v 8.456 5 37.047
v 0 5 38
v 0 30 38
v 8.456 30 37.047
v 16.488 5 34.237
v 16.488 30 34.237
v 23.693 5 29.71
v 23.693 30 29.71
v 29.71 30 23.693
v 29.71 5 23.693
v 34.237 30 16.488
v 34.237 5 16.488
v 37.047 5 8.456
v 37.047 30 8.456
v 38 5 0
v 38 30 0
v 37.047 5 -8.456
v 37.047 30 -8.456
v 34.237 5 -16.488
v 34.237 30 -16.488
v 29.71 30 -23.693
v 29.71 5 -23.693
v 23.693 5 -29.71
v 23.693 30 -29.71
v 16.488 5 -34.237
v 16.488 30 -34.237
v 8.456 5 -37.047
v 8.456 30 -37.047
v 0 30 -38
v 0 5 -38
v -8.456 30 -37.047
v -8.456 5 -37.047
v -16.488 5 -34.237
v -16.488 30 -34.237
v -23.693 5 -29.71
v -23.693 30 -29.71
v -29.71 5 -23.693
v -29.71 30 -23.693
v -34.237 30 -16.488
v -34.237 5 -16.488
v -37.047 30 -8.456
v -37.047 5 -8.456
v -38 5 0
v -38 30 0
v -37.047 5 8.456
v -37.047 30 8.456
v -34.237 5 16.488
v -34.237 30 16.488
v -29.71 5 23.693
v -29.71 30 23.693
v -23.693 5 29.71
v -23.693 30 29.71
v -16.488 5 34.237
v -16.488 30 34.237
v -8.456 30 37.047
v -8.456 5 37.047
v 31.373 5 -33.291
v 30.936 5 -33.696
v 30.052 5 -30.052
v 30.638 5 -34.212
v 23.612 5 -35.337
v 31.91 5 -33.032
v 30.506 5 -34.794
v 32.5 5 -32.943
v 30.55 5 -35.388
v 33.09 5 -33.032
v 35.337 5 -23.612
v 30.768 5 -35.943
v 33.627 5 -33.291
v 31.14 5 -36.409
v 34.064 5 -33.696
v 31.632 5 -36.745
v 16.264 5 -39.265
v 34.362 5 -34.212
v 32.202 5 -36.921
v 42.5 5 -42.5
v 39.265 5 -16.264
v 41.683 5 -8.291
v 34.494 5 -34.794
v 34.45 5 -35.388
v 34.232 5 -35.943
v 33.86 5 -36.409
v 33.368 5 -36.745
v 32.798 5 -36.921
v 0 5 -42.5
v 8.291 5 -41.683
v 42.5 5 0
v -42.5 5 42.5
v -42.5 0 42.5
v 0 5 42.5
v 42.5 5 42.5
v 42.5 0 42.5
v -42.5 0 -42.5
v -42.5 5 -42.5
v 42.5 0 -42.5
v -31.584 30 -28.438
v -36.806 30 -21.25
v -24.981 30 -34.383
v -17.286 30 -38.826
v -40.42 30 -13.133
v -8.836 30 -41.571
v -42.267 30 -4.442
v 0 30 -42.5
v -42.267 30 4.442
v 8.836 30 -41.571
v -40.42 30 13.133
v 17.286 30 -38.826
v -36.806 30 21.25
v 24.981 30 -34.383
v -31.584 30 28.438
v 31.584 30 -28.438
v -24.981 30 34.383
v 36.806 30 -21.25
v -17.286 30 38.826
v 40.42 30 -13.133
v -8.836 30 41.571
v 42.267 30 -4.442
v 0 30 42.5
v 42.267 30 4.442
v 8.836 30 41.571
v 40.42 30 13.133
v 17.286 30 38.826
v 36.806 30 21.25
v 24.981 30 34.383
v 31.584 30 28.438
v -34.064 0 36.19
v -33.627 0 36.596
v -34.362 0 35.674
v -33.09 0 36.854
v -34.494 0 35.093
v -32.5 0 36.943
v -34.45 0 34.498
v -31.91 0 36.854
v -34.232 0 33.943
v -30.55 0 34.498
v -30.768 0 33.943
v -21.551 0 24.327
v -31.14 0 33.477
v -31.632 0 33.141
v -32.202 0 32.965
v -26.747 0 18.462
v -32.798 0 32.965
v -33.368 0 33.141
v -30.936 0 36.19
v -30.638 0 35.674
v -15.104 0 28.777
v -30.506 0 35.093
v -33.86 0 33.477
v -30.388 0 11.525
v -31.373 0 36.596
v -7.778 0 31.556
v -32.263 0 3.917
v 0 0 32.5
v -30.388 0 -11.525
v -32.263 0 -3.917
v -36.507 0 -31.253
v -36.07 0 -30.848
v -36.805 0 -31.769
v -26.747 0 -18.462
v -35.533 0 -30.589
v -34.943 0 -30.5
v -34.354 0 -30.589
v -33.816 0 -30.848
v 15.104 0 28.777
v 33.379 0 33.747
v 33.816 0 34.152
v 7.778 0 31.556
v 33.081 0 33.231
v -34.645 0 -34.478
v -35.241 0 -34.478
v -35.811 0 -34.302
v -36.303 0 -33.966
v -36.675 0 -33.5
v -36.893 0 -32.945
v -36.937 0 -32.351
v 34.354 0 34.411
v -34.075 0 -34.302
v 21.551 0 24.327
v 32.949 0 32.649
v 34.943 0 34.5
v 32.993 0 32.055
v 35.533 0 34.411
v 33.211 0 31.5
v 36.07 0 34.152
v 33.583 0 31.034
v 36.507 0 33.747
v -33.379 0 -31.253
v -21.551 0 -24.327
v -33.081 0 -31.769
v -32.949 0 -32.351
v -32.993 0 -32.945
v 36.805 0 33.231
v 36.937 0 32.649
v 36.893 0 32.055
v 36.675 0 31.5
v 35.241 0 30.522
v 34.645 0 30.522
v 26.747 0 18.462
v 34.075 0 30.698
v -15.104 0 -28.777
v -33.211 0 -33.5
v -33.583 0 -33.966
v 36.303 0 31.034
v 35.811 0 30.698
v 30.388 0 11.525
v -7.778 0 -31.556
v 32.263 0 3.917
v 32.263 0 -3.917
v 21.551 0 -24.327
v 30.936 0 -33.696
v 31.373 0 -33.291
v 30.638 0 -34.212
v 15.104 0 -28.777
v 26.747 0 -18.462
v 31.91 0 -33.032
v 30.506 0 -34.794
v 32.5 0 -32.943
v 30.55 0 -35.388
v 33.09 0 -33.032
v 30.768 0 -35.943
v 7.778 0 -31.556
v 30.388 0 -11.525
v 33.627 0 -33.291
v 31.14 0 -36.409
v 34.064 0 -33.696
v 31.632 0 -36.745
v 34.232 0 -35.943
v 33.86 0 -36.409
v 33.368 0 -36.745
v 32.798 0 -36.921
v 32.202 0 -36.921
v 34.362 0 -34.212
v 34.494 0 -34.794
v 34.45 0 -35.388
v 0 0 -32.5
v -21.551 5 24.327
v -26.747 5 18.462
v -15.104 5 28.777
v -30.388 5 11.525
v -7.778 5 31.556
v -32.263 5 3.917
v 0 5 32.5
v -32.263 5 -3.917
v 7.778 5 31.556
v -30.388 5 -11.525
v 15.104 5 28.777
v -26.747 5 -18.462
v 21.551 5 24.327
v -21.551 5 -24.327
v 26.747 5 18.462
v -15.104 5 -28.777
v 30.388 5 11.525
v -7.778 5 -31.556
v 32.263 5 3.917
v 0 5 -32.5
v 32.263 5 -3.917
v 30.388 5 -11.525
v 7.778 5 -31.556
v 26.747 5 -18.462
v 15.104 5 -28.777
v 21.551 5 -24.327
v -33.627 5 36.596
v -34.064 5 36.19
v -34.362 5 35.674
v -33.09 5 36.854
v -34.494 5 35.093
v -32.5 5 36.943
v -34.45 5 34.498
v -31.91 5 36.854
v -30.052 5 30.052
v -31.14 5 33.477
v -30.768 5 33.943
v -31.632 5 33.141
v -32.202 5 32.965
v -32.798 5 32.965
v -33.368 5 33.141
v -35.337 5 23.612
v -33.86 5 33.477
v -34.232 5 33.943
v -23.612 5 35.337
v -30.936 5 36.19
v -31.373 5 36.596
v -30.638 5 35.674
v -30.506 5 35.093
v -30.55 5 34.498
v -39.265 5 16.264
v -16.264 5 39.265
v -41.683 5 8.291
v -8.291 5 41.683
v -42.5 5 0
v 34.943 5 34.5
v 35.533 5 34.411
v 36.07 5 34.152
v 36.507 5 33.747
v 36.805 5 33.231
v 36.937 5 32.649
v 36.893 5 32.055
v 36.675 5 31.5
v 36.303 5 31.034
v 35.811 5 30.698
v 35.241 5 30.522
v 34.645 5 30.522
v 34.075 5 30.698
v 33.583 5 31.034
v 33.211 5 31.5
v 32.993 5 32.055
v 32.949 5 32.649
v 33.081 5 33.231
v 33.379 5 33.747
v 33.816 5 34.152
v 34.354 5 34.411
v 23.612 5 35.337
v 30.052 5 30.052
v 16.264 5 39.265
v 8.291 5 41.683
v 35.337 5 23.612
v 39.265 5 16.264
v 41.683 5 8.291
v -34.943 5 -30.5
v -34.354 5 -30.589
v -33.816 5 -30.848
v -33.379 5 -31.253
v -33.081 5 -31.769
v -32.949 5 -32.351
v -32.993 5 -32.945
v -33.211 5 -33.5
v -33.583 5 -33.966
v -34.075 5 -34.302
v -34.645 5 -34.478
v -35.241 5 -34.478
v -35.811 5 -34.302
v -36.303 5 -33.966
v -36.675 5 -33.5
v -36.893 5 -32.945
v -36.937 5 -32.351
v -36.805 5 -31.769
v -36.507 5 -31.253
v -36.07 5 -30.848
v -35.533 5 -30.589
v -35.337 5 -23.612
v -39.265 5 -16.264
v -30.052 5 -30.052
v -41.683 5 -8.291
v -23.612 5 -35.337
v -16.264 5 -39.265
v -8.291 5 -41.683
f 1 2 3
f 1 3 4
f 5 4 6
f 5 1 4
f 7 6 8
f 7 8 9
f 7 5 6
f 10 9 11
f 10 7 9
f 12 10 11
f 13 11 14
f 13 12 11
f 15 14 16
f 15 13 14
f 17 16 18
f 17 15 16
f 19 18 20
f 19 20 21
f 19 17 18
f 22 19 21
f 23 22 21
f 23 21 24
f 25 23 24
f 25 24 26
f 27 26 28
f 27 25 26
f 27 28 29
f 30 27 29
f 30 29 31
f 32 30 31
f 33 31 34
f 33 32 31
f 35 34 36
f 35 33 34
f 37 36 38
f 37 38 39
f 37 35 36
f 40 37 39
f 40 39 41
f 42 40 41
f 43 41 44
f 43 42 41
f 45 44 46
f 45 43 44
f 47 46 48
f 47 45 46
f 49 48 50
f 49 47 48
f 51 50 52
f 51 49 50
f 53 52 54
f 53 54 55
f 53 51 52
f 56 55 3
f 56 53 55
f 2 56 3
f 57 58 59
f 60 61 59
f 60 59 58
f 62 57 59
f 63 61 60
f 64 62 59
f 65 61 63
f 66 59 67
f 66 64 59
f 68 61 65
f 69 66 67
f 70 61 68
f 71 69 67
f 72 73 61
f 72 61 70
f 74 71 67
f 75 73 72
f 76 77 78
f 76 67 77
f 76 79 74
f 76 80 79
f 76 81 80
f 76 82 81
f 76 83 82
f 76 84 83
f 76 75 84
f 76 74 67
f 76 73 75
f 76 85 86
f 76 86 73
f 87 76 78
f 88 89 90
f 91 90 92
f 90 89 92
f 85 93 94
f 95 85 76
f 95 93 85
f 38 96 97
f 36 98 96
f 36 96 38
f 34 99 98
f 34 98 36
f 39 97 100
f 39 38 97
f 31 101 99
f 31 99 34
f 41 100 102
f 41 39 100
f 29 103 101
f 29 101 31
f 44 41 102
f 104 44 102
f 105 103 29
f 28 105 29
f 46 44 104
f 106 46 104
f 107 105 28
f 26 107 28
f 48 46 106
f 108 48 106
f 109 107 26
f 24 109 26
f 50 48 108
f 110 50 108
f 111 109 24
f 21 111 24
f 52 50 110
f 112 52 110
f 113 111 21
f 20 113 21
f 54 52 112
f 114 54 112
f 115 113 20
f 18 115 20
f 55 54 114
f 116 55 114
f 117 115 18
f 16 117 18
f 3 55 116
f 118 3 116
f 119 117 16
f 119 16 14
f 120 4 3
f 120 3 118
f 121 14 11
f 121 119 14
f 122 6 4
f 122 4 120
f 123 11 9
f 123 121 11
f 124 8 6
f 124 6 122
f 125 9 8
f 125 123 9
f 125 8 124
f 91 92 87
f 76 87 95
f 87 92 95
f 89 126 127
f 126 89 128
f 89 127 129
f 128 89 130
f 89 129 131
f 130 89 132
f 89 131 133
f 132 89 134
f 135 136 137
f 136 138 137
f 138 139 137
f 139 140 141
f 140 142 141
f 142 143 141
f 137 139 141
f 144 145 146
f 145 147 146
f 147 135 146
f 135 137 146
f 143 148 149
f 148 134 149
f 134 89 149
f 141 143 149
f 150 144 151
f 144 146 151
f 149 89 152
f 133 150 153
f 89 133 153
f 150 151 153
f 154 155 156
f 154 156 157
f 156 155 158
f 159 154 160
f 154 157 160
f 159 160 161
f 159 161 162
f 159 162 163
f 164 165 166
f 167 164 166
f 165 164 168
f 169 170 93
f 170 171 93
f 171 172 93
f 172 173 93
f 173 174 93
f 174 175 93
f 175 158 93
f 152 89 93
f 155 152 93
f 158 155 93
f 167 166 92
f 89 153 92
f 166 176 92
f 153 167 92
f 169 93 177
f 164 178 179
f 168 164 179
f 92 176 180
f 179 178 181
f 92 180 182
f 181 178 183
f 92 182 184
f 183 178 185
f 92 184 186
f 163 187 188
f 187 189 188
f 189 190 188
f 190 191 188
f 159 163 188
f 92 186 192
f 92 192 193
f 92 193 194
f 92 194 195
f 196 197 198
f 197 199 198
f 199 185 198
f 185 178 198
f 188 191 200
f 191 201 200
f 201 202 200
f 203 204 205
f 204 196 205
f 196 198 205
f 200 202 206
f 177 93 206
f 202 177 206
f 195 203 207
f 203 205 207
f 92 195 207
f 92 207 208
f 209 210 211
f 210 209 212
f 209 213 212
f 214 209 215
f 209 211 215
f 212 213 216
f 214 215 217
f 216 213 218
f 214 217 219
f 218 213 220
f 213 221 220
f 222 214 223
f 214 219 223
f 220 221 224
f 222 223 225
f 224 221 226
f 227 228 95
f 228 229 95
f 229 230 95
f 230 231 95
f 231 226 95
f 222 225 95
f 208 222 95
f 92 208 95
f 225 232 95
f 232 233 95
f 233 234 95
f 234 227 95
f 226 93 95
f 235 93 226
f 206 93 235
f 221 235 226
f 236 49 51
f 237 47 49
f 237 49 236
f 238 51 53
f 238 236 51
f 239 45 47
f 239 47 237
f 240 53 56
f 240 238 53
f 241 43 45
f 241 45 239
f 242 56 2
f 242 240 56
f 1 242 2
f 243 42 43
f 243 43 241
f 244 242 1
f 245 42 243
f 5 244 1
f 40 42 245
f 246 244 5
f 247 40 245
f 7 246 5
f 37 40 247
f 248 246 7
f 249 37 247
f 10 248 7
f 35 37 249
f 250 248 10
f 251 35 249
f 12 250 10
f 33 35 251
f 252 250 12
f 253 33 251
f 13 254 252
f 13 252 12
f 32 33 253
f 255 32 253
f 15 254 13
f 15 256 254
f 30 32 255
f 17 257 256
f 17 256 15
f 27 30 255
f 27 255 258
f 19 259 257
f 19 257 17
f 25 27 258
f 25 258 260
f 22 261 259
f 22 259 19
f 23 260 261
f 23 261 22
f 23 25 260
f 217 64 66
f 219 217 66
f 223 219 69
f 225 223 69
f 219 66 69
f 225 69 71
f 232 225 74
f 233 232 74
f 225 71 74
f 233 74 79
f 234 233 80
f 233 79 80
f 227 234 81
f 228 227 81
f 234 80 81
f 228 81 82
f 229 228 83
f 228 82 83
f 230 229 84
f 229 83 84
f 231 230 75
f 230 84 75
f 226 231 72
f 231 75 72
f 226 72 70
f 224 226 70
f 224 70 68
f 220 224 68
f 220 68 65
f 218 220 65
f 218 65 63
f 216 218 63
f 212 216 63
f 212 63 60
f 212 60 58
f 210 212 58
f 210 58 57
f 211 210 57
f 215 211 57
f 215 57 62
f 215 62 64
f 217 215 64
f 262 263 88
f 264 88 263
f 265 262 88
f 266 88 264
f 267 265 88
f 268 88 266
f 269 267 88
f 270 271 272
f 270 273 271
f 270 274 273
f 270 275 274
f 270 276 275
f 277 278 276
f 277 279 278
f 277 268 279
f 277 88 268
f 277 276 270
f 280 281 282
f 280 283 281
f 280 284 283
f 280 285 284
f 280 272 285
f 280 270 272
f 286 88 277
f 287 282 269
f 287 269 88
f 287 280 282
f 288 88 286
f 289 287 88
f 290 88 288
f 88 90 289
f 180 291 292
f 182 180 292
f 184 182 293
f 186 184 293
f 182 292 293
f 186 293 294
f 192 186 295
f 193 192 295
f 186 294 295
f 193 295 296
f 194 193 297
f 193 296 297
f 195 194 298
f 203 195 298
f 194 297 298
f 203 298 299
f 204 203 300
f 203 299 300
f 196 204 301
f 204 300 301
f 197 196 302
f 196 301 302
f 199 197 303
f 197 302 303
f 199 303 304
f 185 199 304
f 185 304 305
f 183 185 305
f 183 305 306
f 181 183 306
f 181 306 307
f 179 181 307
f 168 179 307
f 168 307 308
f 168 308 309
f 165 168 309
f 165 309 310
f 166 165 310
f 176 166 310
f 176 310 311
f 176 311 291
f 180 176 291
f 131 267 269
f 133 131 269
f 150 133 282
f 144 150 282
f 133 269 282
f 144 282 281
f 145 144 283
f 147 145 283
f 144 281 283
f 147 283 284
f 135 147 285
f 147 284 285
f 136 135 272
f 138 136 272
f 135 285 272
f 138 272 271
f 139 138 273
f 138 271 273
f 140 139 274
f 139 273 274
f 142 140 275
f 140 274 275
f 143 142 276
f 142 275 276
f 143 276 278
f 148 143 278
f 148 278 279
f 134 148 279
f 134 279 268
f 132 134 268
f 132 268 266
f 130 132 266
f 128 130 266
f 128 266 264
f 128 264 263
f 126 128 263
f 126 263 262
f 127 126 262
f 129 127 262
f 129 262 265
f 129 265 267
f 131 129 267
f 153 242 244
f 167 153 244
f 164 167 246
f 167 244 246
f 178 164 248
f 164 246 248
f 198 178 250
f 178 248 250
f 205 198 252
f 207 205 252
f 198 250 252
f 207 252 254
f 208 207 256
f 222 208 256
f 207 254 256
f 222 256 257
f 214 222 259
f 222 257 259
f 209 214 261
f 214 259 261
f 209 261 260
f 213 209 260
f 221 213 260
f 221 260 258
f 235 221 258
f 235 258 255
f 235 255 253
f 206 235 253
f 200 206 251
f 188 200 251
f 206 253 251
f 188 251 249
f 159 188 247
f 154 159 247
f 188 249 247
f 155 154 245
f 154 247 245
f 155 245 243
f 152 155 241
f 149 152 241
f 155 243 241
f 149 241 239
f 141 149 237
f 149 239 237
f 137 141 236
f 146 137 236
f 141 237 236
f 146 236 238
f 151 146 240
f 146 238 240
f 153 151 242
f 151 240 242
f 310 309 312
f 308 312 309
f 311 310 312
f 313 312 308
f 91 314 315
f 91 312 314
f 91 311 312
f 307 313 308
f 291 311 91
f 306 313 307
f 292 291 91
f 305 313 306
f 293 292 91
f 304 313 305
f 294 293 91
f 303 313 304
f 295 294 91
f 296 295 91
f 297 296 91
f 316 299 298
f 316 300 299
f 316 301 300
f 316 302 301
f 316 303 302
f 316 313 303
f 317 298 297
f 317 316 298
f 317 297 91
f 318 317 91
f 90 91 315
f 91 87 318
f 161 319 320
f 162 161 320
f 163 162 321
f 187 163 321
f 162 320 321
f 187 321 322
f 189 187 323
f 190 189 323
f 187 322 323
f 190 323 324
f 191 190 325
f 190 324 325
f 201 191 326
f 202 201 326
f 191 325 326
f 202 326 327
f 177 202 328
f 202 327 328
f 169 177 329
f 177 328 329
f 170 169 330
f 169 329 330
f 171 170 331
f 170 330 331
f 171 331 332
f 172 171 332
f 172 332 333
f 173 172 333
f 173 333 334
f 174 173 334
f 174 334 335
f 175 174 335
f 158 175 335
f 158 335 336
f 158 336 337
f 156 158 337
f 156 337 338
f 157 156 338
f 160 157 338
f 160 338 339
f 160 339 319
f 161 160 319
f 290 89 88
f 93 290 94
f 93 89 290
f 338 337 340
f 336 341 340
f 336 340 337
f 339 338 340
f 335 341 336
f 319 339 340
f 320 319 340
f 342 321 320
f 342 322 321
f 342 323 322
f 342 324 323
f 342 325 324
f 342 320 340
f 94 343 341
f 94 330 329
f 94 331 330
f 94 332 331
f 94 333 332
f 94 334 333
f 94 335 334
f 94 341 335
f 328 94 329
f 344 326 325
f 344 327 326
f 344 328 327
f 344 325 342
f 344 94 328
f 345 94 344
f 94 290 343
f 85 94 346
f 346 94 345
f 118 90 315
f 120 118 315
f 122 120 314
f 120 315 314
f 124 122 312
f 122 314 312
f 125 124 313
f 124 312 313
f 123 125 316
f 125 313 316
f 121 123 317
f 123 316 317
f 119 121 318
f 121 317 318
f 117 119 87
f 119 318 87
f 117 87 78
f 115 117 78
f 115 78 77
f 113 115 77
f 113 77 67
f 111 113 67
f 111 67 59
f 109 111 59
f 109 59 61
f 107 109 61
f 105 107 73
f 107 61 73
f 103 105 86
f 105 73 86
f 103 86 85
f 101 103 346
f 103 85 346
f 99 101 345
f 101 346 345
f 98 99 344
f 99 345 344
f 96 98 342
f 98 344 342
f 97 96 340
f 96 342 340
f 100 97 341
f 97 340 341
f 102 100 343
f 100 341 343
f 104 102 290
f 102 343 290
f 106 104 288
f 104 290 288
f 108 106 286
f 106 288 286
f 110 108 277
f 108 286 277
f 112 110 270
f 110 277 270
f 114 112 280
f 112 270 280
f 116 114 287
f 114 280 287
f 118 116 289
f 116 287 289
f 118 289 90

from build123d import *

# Parameters (mm, degrees)
IZIM1_W                     = 85
IZIM1_H                     = 85
Y_KSEKLIK_EKSTR_ZYON1_DEPTH = 5
IZIM2_R                     = 32.5
KES_EKSTR_ZYON1_DEPTH       = 5
IZIM3_R                     = 42.5
IZIM3_R_2                   = 38
Y_KSEKLIK_EKSTR_ZYON2_DEPTH = 25
IZIM4_R                     = 2
KES_EKSTR_ZYON2_DEPTH       = 25


with BuildPart() as part:
    # Çizim1 → Yükseklik-Ekstrüzyon1 (new body)
    with BuildSketch(Plane(origin=(0, 0, 0), x_dir=(1, 0, 0), z_dir=(0, 1, 0))):
        Rectangle(IZIM1_W, IZIM1_H)
    extrude(amount=Y_KSEKLIK_EKSTR_ZYON1_DEPTH)

    # Çizim2 → Kes-Ekstrüzyon1 (cut)
    with BuildSketch(Plane(origin=(0, 5, 0), x_dir=(1, 0, 0), z_dir=(0, 1, 0))):
        with Locations(Location((0, 0, 0), (0, 0, 270))):
            Circle(IZIM2_R)
    extrude(amount=-KES_EKSTR_ZYON1_DEPTH, mode=Mode.SUBTRACT)

    # Çizim3 → Yükseklik-Ekstrüzyon2 (add)
    with BuildSketch(Plane(origin=(0, 5, 0), x_dir=(1, 0, 0), z_dir=(0, 1, 0))):
        with Locations(Location((0, 0, 0), (0, 0, 270))):
            Circle(IZIM3_R)
        with Locations(Location((0, 0, 0), (0, 0, 270))):
            Circle(IZIM3_R_2, mode=Mode.SUBTRACT)
    extrude(amount=Y_KSEKLIK_EKSTR_ZYON2_DEPTH)

    # Çizim4 → Kes-Ekstrüzyon2 (cut)
    with BuildSketch(Plane(origin=(0, 5, 0), x_dir=(1, 0, 0), z_dir=(0, 1, 0))):
        with Locations(Location((-34.943063938, 32.5, 0), (0, 0, 270))):
            Circle(IZIM4_R)
        with Locations(Location((32.5, 34.943063938, 0), (0, 0, 270))):
            Circle(IZIM4_R)
        with Locations(Location((34.943063938, -32.5, 0), (0, 0, 270))):
            Circle(IZIM4_R)
        with Locations(Location((-32.5, -34.943063938, 0), (0, 0, 270))):
            Circle(IZIM4_R)
    extrude(amount=-KES_EKSTR_ZYON2_DEPTH, mode=Mode.SUBTRACT)


solid = part.part
